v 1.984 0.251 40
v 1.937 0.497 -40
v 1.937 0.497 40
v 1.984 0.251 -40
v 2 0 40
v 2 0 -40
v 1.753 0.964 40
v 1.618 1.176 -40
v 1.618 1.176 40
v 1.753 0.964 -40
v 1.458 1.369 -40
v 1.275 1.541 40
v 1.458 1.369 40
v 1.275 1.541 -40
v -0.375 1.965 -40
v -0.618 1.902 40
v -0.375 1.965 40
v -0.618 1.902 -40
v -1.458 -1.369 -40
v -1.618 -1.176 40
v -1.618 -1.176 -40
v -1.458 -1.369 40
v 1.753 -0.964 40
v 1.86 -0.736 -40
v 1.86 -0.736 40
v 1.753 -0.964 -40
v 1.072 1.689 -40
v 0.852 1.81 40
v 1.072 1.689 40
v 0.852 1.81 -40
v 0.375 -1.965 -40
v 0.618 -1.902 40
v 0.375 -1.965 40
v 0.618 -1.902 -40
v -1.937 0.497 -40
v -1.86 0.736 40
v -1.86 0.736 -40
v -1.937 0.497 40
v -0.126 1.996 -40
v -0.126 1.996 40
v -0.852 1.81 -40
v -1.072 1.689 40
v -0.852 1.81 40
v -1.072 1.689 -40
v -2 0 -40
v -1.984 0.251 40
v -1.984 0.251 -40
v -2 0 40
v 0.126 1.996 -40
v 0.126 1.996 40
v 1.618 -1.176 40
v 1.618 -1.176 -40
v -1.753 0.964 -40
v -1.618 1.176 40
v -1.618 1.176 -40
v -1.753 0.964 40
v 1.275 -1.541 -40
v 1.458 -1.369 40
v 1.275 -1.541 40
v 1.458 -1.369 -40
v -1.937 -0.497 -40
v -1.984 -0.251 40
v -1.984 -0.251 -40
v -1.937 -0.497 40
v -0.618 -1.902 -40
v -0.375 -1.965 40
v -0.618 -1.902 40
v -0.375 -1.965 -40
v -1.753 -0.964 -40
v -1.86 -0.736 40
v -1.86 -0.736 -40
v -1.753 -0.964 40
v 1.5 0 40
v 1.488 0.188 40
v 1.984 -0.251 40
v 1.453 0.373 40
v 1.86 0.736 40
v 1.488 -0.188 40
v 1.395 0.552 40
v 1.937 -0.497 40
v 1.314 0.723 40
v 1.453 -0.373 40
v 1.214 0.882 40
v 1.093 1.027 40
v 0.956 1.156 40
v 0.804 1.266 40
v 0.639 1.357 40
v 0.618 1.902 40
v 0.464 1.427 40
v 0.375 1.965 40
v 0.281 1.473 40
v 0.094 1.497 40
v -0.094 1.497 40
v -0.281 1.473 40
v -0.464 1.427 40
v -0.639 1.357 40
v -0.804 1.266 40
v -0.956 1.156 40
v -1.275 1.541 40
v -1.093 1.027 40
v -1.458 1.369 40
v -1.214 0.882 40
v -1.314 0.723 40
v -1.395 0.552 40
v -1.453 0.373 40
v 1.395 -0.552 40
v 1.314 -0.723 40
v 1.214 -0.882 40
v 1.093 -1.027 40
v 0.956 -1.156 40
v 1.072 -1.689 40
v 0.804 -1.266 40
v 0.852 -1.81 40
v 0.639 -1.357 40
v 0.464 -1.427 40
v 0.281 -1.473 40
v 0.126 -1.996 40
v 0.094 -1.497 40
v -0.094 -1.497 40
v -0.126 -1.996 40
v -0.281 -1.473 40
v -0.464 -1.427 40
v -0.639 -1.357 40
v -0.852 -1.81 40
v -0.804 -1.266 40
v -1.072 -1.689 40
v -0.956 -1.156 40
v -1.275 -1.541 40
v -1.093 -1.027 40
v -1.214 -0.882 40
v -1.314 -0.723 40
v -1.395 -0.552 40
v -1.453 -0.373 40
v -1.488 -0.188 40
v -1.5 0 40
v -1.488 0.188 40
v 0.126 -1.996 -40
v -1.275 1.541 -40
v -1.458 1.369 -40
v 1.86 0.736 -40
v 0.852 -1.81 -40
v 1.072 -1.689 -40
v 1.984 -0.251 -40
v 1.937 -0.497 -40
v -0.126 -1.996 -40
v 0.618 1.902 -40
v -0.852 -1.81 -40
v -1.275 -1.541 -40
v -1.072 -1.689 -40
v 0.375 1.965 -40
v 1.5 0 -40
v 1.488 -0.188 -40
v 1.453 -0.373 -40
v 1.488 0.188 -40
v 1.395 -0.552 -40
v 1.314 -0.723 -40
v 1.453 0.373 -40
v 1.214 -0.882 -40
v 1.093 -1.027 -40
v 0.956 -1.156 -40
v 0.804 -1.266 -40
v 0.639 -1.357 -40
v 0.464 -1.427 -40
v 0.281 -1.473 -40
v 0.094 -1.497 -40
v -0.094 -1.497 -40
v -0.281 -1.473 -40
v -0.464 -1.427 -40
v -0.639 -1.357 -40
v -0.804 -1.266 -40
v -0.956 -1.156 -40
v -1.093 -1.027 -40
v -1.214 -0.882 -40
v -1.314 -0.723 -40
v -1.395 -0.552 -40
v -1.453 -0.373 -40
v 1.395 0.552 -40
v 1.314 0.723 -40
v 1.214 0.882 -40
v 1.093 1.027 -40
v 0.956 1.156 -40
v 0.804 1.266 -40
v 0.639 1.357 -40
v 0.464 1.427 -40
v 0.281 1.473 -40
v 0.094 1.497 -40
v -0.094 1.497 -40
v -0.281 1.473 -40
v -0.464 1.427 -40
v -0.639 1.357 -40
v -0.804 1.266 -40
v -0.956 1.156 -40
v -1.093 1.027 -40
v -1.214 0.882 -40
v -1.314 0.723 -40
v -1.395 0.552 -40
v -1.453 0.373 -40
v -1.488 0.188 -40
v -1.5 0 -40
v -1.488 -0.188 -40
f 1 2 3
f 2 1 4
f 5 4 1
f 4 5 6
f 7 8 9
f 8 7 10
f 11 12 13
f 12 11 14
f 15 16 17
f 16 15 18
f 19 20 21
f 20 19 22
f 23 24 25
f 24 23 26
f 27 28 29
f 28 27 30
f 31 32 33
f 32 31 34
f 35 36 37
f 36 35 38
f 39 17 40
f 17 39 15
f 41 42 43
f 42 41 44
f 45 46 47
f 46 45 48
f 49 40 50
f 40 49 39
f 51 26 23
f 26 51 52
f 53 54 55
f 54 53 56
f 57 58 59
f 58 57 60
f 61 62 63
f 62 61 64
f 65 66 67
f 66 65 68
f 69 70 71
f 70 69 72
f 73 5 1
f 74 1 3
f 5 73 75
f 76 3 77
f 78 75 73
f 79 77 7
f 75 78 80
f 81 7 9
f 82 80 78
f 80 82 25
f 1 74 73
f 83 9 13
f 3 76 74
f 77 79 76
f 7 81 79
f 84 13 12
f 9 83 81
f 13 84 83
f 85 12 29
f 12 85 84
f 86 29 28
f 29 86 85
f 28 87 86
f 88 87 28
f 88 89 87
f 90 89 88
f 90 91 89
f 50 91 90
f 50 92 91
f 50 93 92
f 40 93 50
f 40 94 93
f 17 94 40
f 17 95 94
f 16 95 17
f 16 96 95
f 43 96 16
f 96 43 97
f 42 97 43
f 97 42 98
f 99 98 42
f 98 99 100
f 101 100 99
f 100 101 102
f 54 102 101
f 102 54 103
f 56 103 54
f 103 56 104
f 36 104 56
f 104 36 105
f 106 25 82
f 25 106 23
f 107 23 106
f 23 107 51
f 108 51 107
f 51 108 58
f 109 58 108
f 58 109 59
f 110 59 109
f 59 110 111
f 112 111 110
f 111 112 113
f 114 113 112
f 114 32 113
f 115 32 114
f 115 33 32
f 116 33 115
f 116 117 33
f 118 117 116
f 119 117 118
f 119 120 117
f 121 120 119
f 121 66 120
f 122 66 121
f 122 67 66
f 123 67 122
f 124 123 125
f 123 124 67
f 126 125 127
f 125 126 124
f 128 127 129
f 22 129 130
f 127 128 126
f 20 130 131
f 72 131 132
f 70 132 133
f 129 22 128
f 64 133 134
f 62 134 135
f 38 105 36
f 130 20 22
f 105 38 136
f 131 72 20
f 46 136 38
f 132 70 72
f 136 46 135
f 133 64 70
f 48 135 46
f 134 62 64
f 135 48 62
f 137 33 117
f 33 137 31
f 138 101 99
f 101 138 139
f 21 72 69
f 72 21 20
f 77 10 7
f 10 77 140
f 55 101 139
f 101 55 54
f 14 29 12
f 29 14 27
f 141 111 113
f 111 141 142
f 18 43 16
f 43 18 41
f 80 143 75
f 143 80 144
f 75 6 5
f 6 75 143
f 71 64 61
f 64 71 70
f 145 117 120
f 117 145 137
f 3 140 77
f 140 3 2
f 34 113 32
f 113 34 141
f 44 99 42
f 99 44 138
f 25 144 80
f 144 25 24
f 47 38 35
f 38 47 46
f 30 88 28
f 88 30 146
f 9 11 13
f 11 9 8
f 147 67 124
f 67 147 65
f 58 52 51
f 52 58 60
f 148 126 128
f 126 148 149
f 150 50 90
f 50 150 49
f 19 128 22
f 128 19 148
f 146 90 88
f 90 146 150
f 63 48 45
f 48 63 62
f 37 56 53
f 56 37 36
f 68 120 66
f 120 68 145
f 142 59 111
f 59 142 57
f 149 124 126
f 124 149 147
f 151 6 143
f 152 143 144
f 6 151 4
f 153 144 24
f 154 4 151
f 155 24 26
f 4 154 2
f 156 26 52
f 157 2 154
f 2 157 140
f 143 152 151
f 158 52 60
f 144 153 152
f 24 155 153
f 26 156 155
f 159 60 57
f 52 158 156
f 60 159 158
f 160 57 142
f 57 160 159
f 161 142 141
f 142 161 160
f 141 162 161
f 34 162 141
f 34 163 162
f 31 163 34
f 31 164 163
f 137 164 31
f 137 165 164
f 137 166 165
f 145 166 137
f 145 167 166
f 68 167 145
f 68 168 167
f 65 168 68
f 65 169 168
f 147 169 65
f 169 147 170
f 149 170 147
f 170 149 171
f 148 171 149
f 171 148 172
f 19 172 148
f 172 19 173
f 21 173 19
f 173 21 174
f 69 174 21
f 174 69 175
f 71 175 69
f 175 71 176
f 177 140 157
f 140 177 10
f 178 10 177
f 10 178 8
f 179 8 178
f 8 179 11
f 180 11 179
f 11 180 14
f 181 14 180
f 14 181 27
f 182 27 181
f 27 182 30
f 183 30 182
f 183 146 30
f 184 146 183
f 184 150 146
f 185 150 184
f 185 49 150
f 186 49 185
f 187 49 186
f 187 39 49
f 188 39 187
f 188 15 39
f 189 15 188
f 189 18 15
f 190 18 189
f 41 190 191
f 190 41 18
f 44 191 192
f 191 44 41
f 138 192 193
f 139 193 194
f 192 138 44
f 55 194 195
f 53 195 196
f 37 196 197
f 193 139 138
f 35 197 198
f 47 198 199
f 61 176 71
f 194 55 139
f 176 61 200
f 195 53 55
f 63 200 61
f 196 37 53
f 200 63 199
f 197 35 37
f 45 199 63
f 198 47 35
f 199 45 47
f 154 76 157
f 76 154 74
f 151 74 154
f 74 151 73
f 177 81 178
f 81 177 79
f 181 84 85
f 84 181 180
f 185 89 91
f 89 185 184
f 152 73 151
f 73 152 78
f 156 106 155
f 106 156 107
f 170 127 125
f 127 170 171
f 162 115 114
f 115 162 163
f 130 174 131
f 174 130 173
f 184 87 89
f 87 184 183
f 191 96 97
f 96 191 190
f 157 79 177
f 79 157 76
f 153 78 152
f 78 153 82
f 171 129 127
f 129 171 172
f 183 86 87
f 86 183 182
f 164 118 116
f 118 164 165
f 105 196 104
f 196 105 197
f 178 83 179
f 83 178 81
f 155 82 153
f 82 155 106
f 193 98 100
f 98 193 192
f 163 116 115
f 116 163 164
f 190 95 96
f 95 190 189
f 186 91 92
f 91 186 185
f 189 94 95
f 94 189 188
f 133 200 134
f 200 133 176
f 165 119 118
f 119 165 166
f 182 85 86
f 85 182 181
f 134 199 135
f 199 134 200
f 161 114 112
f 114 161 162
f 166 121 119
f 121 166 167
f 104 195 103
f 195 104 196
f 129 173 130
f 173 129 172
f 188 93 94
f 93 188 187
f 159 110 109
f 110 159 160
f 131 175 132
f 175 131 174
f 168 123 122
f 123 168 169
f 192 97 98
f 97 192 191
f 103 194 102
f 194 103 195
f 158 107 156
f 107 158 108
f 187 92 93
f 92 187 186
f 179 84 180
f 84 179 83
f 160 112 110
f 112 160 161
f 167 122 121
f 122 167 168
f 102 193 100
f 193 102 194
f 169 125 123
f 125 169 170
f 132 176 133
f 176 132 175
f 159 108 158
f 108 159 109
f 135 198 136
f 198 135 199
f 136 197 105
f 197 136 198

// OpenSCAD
$fn = 50;


difference() {
	union() {
		translate(v = [0, 0, -40.0000000000]) {
			cylinder(h = 80, r = 2.0000000000);
		}
	}
	union() {
		translate(v = [0, 0, -100.0000000000]) {
			cylinder(h = 200, r = 1.5000000000);
		}
	}
}
